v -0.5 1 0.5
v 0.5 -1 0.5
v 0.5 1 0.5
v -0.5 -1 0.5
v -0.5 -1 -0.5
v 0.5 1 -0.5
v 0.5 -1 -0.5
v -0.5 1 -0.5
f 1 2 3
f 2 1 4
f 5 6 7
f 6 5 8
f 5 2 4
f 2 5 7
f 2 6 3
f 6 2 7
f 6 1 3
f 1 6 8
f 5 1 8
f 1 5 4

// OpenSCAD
module mycube2(a,b) {
    cube(size=[a, b, 1], center=true);
}

module mycube(a,b,c) {
    mycube2(a,b);
}

mycube(1,2,3);
